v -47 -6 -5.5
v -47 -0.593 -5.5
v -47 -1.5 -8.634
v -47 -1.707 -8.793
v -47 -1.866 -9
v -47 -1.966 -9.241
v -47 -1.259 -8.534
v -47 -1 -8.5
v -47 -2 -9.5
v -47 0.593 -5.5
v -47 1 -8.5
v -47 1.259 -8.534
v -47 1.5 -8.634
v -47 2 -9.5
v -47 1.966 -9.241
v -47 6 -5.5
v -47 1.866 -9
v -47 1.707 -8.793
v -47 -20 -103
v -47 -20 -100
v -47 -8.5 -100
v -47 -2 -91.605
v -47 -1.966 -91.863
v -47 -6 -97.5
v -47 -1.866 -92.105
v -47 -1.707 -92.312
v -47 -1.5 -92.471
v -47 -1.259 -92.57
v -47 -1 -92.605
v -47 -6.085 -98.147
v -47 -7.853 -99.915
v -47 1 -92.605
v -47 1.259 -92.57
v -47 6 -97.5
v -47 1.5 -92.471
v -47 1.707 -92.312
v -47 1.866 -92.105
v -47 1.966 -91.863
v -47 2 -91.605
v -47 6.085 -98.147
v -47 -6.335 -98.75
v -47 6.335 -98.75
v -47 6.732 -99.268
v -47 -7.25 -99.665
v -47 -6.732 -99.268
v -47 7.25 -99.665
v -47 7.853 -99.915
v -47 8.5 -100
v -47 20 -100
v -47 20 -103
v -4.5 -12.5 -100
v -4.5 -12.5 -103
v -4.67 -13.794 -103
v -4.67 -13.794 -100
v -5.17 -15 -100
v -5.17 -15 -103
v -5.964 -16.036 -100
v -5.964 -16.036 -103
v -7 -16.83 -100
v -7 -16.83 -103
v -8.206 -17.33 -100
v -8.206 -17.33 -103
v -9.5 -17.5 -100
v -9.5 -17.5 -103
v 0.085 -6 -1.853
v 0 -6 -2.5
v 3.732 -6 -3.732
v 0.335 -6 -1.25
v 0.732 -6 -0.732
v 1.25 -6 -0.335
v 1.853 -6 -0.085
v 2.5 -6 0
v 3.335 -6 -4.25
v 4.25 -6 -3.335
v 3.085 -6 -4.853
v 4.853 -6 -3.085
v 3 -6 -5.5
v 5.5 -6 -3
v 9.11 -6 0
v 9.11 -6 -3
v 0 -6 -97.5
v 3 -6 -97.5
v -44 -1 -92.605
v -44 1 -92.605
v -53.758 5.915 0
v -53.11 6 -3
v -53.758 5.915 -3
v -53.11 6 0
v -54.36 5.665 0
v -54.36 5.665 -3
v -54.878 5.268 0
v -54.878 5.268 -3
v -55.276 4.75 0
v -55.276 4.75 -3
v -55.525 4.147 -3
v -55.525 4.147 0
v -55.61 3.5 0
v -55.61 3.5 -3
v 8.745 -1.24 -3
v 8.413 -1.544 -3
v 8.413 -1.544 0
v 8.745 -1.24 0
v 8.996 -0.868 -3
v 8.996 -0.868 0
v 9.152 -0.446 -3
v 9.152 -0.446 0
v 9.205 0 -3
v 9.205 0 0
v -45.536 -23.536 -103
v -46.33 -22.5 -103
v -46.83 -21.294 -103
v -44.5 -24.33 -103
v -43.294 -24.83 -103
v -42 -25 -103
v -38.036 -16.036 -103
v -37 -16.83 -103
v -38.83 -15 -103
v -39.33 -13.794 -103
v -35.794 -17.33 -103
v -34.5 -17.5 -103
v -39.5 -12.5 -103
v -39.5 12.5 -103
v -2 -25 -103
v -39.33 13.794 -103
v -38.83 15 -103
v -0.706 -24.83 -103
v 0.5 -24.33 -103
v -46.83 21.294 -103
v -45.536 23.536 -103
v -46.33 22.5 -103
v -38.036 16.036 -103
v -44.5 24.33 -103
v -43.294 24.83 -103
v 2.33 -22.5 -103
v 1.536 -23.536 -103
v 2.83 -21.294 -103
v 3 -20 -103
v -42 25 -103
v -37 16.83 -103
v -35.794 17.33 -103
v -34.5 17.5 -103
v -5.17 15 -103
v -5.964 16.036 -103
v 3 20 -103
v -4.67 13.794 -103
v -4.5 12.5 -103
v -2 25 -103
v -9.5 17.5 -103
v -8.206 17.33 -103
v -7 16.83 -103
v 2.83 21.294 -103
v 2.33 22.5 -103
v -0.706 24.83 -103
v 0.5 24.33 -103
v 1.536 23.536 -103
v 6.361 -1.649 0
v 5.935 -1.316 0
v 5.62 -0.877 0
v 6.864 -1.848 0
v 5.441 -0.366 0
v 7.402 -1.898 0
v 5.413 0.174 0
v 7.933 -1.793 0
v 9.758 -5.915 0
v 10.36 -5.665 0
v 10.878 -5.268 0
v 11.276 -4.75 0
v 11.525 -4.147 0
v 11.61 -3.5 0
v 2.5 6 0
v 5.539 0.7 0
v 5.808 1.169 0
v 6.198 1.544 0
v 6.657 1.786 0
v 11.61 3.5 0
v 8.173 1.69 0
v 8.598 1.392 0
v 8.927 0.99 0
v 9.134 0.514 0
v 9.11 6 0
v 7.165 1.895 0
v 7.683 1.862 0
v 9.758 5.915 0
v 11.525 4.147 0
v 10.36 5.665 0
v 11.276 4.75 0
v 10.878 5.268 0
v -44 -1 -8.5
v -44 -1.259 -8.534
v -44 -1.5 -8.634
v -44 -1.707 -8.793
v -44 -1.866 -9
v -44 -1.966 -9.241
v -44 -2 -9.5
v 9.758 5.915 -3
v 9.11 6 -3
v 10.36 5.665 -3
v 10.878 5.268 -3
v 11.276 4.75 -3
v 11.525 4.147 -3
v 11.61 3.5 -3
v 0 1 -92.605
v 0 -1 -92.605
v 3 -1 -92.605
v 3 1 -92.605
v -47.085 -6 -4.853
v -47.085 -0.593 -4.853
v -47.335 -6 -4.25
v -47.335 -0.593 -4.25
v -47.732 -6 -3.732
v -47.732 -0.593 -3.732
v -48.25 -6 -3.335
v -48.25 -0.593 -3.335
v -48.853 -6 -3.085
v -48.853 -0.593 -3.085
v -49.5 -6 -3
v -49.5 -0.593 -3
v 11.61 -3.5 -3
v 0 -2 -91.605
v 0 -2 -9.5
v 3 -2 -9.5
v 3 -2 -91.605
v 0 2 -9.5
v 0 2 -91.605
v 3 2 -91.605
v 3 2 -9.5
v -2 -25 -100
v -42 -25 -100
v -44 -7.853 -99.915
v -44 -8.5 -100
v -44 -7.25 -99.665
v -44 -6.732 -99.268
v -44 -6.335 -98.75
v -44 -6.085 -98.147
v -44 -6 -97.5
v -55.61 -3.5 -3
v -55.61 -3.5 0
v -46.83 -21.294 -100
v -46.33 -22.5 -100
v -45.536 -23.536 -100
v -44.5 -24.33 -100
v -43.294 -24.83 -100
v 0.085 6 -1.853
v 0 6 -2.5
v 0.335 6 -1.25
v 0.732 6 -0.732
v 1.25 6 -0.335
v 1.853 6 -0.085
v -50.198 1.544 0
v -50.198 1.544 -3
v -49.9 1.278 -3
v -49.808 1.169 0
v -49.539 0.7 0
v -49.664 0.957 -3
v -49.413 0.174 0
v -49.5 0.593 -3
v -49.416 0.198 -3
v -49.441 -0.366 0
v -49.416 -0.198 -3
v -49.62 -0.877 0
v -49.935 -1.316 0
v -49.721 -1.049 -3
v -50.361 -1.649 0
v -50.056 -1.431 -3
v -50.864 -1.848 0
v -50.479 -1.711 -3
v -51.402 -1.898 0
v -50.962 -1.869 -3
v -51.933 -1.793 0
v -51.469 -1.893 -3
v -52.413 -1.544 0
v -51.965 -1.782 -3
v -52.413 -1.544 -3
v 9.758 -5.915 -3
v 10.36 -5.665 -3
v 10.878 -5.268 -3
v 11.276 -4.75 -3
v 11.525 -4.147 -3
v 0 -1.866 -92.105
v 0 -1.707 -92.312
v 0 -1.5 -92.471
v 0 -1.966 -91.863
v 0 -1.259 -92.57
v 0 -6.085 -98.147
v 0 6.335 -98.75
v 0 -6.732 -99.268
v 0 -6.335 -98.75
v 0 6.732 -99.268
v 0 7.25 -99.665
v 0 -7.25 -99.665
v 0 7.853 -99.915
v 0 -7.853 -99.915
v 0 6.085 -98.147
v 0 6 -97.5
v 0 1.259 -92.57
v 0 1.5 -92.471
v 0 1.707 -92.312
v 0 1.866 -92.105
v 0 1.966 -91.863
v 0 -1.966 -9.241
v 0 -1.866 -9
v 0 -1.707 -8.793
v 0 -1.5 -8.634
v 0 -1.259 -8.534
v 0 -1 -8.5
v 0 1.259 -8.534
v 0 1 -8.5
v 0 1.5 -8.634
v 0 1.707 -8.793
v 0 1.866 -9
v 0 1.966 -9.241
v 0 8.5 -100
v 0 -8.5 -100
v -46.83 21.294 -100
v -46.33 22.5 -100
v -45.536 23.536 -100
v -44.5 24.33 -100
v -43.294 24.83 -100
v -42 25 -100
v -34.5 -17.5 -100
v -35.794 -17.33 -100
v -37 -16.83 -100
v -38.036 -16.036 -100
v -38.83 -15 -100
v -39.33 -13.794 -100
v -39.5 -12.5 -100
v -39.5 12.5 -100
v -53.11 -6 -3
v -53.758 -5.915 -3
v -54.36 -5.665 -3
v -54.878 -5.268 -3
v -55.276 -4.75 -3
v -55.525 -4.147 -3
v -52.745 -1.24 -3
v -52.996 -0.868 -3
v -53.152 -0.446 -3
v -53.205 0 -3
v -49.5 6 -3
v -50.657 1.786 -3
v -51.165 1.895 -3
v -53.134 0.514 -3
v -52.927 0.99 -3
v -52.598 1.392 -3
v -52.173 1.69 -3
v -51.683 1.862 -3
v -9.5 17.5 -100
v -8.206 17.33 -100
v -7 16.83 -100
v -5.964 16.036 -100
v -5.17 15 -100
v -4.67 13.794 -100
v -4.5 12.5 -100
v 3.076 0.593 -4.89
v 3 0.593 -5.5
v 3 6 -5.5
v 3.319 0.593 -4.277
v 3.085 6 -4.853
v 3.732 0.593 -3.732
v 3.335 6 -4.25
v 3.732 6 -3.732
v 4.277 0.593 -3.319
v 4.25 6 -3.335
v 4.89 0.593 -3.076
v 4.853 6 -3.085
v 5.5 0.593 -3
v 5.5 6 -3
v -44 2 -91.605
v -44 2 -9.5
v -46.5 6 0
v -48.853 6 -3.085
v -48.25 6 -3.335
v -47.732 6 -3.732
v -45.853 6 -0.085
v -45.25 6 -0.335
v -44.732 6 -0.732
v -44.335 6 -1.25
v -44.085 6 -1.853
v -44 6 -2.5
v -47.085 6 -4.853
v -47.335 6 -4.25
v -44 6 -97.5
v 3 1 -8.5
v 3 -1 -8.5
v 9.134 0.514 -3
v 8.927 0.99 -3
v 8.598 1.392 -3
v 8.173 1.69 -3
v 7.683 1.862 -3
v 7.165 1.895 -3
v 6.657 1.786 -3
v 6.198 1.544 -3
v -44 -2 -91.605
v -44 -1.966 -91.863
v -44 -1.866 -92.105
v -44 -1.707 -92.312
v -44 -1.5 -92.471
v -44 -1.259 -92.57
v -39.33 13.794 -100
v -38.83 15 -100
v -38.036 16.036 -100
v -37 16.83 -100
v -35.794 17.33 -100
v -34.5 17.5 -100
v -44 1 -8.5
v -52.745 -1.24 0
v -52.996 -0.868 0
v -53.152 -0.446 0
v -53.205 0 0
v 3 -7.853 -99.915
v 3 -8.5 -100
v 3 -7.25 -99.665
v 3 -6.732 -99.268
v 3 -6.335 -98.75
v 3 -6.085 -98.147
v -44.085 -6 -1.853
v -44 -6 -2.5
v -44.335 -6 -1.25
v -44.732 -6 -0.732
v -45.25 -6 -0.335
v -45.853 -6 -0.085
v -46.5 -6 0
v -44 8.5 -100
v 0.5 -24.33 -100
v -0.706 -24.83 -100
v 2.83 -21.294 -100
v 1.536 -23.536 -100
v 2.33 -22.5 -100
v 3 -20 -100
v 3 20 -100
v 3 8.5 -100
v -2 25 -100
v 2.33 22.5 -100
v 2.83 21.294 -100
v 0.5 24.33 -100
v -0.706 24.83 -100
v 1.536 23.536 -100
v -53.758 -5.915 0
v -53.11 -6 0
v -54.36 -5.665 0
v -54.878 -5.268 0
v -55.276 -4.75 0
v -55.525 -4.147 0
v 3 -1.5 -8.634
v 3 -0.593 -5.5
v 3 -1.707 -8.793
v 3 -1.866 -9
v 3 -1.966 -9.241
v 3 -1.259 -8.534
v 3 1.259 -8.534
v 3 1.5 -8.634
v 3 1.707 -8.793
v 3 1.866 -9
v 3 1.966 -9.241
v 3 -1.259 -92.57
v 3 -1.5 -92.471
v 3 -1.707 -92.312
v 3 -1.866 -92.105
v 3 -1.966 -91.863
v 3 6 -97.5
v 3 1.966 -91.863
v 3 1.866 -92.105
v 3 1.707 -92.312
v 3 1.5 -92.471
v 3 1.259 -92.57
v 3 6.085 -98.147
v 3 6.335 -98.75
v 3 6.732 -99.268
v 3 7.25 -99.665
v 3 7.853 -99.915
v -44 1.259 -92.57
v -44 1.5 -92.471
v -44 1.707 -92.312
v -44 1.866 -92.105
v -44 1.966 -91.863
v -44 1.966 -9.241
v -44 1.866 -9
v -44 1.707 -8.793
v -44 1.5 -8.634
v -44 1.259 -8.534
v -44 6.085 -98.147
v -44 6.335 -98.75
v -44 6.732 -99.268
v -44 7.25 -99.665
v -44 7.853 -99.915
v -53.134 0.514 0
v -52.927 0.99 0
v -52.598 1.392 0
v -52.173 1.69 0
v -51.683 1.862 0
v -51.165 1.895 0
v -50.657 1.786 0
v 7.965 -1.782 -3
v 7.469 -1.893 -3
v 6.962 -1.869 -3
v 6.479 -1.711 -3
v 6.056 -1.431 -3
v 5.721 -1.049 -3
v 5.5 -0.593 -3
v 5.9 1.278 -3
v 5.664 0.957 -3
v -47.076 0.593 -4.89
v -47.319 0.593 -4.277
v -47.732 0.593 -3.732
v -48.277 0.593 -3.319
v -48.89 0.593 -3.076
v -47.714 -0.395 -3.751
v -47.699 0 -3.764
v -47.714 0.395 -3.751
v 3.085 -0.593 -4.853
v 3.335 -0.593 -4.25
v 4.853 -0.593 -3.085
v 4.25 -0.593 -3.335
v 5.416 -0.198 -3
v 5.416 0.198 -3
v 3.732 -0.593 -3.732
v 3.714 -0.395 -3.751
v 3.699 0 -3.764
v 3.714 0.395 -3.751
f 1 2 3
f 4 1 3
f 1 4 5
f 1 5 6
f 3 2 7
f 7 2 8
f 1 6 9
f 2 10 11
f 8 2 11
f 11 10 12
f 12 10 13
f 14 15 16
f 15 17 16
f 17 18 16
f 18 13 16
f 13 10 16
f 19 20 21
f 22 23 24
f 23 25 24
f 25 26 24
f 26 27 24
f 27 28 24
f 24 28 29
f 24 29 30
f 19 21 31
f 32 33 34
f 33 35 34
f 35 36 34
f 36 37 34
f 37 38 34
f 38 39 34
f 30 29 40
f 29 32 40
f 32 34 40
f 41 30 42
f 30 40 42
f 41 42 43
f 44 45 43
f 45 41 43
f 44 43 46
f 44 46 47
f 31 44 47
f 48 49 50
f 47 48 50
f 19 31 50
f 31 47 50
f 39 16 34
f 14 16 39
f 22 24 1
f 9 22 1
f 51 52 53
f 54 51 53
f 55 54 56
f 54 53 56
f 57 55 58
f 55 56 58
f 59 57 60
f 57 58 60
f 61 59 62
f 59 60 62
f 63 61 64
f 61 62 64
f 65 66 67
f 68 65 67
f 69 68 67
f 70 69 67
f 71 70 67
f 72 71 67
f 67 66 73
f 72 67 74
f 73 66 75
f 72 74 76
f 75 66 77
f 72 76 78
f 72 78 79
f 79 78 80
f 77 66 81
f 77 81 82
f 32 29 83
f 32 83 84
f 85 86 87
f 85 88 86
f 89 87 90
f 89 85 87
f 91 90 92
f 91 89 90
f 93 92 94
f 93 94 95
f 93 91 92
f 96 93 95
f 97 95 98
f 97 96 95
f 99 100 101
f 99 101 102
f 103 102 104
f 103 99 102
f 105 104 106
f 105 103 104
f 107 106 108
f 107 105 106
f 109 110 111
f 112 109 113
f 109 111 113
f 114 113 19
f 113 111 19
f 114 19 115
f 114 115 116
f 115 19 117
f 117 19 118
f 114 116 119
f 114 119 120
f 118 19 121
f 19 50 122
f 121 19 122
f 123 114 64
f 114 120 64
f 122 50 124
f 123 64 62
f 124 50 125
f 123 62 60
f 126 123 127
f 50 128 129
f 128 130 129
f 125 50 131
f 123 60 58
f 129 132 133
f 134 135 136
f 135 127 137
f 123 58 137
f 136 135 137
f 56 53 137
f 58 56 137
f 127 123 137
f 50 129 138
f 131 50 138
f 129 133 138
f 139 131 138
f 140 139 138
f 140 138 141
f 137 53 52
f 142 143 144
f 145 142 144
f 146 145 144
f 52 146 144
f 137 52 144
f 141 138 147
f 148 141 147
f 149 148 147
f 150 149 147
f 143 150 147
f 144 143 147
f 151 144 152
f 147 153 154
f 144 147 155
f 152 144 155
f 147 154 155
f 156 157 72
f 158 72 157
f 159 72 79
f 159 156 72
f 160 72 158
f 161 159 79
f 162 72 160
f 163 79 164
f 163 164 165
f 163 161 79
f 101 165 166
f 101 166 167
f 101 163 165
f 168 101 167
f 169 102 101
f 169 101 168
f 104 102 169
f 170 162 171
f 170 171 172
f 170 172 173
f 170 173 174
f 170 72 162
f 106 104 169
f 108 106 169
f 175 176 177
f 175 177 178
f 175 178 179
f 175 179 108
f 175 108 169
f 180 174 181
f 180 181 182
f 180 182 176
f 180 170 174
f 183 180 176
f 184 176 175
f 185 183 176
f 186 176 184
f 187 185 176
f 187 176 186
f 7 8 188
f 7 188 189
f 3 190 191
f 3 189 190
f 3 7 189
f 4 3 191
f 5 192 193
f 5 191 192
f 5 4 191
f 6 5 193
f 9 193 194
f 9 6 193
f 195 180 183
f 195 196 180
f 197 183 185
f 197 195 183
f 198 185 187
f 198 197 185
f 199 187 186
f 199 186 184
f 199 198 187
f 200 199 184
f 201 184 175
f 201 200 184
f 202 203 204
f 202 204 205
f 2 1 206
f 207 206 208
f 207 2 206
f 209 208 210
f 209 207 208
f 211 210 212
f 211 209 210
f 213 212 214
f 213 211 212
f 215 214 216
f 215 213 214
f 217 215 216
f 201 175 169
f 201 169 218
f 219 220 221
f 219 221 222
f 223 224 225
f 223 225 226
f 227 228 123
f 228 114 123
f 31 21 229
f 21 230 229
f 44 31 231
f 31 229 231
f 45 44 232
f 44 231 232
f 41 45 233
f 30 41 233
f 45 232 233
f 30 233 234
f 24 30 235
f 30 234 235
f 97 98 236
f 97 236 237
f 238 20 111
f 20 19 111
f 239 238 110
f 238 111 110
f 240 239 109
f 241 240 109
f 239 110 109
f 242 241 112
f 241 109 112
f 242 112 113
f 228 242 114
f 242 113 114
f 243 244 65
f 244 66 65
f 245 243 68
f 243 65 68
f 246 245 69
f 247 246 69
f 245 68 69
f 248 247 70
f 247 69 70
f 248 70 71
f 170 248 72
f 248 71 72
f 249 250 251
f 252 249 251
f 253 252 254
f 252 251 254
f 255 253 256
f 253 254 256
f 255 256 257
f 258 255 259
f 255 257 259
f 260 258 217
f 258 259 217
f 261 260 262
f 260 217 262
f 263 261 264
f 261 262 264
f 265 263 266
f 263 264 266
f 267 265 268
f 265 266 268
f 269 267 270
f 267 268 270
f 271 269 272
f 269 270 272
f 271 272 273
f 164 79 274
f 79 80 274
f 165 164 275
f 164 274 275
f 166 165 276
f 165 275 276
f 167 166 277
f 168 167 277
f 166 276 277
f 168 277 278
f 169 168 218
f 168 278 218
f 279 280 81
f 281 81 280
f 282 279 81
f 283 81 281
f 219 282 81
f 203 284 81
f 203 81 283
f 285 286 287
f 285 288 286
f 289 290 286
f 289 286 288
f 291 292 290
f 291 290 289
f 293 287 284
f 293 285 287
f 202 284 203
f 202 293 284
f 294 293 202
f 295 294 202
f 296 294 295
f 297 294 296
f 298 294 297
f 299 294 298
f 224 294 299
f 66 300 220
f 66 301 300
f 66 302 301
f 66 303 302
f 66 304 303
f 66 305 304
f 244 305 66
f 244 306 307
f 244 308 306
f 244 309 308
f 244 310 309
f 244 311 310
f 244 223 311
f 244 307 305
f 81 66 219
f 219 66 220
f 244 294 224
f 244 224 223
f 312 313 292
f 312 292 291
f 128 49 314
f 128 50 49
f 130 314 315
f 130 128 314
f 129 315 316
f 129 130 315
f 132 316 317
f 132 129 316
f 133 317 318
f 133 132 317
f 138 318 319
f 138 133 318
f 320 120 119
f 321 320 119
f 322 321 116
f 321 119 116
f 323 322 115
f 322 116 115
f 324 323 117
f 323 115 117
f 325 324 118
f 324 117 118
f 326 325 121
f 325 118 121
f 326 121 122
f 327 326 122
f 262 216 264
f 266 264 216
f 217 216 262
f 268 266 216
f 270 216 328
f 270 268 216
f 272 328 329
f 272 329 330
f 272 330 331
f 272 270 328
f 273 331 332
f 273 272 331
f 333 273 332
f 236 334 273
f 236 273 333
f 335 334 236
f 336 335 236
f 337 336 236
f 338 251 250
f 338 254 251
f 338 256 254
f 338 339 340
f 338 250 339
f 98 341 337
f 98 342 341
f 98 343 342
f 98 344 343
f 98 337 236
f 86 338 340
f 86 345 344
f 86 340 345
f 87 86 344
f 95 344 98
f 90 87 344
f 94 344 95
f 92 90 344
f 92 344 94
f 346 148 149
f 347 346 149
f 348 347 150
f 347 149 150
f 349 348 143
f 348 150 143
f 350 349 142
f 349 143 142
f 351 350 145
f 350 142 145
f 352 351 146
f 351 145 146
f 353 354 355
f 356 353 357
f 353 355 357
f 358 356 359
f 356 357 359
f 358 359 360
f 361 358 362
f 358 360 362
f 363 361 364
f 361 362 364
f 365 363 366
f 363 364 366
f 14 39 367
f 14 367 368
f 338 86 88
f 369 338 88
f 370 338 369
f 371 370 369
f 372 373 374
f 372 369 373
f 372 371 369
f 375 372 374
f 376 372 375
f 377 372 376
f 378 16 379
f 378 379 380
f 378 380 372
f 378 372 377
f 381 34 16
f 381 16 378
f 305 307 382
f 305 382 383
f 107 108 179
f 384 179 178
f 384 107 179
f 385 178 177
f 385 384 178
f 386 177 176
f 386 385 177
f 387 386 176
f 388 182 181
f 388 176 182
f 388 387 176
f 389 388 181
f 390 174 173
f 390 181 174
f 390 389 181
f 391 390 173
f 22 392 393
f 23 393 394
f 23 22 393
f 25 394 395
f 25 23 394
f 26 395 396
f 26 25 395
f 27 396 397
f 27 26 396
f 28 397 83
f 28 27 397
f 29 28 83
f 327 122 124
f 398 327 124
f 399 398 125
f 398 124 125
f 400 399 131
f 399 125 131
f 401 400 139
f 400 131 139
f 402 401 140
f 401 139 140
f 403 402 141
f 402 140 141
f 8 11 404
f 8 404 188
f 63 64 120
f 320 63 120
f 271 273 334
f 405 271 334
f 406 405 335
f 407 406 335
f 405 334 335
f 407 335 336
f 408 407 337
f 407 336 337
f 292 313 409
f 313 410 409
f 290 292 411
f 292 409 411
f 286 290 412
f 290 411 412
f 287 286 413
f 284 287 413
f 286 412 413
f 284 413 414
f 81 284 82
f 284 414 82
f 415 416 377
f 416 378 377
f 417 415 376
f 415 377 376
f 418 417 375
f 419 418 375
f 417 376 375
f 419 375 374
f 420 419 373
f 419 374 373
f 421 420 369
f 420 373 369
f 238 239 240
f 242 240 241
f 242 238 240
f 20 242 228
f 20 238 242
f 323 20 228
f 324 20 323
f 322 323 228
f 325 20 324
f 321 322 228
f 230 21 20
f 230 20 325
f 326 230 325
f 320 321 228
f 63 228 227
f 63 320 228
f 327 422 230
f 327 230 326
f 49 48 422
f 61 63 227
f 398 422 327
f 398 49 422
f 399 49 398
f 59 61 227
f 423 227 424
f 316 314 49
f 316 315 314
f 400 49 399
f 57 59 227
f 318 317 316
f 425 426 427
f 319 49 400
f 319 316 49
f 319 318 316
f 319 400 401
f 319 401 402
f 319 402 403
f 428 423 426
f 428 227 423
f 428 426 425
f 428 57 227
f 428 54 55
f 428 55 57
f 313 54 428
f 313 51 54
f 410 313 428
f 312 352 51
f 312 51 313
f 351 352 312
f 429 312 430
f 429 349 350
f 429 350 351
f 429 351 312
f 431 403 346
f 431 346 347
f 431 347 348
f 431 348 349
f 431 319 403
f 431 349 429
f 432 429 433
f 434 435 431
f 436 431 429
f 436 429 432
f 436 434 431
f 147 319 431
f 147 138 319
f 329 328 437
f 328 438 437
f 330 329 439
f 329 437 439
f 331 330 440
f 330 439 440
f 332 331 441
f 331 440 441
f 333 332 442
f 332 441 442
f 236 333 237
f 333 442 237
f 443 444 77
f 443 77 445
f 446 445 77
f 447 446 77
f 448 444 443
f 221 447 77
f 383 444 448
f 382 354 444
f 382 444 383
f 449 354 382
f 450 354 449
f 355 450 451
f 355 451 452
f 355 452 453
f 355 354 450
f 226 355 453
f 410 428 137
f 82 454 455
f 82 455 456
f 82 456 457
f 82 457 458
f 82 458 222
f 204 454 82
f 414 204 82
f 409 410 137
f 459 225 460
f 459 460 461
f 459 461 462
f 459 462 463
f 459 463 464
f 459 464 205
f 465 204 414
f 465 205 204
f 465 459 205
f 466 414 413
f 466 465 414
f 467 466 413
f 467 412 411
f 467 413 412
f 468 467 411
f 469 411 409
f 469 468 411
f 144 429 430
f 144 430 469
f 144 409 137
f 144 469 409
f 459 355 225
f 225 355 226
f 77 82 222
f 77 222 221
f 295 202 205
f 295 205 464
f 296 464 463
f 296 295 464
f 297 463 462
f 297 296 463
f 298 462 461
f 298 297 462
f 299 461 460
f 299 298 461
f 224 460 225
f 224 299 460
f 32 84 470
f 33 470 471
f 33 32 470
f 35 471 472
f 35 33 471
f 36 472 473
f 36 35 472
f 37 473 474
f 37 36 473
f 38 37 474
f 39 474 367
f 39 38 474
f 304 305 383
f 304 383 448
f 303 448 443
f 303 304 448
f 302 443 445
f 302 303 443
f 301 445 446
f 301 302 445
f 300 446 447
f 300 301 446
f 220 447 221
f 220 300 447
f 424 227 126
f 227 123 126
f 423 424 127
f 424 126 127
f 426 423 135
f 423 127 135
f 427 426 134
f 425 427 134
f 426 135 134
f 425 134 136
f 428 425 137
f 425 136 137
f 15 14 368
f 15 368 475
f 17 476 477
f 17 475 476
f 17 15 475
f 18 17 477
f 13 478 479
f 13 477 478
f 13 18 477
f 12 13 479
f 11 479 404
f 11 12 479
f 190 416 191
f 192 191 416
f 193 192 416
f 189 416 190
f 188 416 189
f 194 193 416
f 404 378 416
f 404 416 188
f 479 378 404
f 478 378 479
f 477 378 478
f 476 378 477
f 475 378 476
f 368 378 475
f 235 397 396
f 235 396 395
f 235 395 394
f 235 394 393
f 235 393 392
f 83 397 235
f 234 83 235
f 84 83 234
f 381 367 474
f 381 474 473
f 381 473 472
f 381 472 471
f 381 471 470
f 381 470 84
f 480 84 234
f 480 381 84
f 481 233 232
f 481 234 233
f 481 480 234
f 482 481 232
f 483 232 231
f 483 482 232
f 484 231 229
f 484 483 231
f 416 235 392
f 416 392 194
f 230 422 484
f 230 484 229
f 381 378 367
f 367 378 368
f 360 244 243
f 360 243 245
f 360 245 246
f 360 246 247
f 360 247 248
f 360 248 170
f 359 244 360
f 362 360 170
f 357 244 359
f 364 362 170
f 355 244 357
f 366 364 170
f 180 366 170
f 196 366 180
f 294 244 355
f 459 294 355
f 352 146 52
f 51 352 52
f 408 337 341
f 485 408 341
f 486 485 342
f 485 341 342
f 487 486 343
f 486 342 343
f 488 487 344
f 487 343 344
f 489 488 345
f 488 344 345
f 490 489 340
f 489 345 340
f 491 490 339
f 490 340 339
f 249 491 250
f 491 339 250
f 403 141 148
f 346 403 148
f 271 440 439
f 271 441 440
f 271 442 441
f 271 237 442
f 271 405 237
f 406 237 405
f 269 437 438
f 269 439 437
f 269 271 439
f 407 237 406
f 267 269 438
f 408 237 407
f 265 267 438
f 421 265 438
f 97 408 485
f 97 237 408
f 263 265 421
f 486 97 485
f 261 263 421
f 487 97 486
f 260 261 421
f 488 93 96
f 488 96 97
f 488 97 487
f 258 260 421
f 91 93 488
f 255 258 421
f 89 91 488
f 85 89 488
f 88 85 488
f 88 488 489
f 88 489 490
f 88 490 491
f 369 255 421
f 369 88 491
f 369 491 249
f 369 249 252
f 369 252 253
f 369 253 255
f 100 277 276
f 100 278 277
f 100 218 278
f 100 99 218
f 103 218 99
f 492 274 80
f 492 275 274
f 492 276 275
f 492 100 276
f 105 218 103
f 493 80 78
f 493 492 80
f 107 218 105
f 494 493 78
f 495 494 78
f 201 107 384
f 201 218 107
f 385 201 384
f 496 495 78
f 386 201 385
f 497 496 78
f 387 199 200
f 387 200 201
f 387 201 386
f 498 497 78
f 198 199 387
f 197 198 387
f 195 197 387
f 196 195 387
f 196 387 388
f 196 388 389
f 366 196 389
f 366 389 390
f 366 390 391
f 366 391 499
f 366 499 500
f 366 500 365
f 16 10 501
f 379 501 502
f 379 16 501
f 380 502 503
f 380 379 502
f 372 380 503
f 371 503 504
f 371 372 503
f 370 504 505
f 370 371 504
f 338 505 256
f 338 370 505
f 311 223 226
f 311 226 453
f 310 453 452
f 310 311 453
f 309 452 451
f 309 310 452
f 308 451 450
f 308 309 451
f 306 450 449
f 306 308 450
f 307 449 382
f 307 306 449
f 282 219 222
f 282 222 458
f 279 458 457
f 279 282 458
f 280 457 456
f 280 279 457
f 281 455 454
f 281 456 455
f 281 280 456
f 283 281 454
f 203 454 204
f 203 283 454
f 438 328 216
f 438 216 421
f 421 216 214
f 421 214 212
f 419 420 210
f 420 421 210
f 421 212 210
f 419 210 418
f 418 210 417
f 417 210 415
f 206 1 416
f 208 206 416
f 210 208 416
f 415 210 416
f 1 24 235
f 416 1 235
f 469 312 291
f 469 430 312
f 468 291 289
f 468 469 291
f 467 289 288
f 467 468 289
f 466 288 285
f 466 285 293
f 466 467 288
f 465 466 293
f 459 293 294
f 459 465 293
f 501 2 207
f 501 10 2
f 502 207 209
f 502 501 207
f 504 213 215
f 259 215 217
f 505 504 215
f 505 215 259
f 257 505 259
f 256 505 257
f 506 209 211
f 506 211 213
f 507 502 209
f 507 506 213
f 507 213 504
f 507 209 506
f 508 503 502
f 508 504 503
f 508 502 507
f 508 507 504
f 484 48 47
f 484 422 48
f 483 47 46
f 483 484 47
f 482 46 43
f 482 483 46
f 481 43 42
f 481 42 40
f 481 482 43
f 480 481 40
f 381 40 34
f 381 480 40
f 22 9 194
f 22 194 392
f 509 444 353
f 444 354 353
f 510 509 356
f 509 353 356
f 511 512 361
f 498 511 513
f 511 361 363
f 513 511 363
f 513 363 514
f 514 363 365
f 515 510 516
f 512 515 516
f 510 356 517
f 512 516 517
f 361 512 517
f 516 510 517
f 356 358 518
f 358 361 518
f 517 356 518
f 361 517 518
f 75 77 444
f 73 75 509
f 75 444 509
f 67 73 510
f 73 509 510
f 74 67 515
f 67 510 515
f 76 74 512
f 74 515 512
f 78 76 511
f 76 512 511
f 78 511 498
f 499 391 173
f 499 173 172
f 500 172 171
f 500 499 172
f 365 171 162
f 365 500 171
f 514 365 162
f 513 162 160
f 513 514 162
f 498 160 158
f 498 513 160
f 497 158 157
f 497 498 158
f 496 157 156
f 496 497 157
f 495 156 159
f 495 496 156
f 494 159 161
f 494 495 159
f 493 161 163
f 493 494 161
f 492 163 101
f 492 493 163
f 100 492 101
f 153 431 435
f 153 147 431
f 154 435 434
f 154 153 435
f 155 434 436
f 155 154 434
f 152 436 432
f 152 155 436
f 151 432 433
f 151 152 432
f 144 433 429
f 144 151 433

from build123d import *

# Parameters (mm, degrees)
BOSS_EXTRUDE1_DEPTH = 6
SKETCH2_W           = 50
SKETCH2_H           = 3
BOSS_EXTRUDE2_DEPTH = 25
CUT_EXTRUDE1_DEPTH  = 50
CUT_EXTRUDE2_DEPTH  = 25
FILLET1_R           = 5
FILLET2_R           = 2.5
CUT_EXTRUDE3_DEPTH  = 88


with BuildPart() as part:
    # Sketch1 → Boss-Extrude1 (new, symmetric)
    with BuildSketch(Plane(origin=(0, 0, 0), x_dir=(1, 0, 0), z_dir=(0, 1, 0))):
        Polygon((0, 0), (11.610474965, 0), (11.610474965, 3), (3, 3), (3, 100), (3, 103), (-47, 103), (-47, 100), (-47, 3), (-55.610474965, 3), (-55.610474965, 0), (-44, 0), (-44, 100), (0, 100), align=None)
    extrude(amount=BOSS_EXTRUDE1_DEPTH, both=True)

    # Sketch2 → Boss-Extrude2 (add, symmetric)
    with BuildSketch(Plane(origin=(0, 0, 0), x_dir=(1, 0, 0), z_dir=(0, 1, 0))):
        with Locations((-22, 101.5)):
            Rectangle(SKETCH2_W, SKETCH2_H)
    extrude(amount=BOSS_EXTRUDE2_DEPTH, both=True)

    # Sketch4 → Cut-Extrude1 (cut)
    with BuildSketch(Plane(origin=(0, 0, -3), x_dir=(-1, 0, 0), z_dir=(0, 0, -1))):
        with BuildLine():
            ThreePointArc((53.205237482, 0), (52.172824783, 1.690352707), (50.197561403, 1.543714256))
            Line((50.197561403, 1.543714256), (52.412913562, -1.543714256))
            ThreePointArc((52.412913562, -1.543714256), (52.99559019, -0.867587301), (53.205237482, 0))
        make_face()
        with BuildLine():
            Line((52.412913562, -1.543714256), (50.197561403, 1.543714256))
            ThreePointArc((50.197561403, 1.543714256), (49.761523227, -1.107676079), (52.412913562, -1.543714256))
        make_face()
    cut_extrude1 = extrude(amount=-CUT_EXTRUDE1_DEPTH, mode=Mode.SUBTRACT)

    # Mirror1: Cut-Extrude1 across plane
    add(cut_extrude1.mirror(Plane(origin=(-22, 0, 0), x_dir=(0, 0, 1), z_dir=(1, 0, 0))), mode=Mode.SUBTRACT)

    # Sketch6 → Cut-Extrude2 (cut, symmetric)
    with BuildSketch(Plane(origin=(0, 0, -103), x_dir=(-1, 0, 0), z_dir=(0, 0, -1))):
        with BuildLine():
            Line((9.5, -17.5), (34.5, -17.5))
            ThreePointArc((34.5, -17.5), (38.035533906, -16.035533906), (39.5, -12.5))
            Line((39.5, -12.5), (39.5, 12.5))
            ThreePointArc((39.5, 12.5), (38.035533906, 16.035533906), (34.5, 17.5))
            Line((34.5, 17.5), (9.5, 17.5))
            ThreePointArc((9.5, 17.5), (5.964466094, 16.035533906), (4.5, 12.5))
            Line((4.5, 12.5), (4.5, -12.5))
            ThreePointArc((4.5, -12.5), (5.964466094, -16.035533906), (9.5, -17.5))
        make_face()
    extrude(amount=CUT_EXTRUDE2_DEPTH, both=True, mode=Mode.SUBTRACT)

    # Fillet1
    fillet1_edges = [part.edges().sort_by_distance(p)[0] for p in [
        (3, 25, -101.5),
        (-47, -25, -101.5),
        (-47, 25, -101.5),
        (3, -25, -101.5),
    ]]
    fillet(fillet1_edges, radius=FILLET1_R)

    # Fillet2
    fillet2_edges = [part.edges().sort_by_distance(p)[0] for p in [
        (11.610474965, 6, -1.5),
        (-55.610474965, -6, -1.5),
        (11.610474965, -6, -1.5),
        (-44, 0, 0),
        (-47, 0, -3),
        (3, 0, -3),
        (0, 0, 0),
        (1.5, -6, -100),
        (-45.5, -6, -100),
        (-55.610474965, 6, -1.5),
        (-45.5, 6, -100),
        (1.5, 6, -100),
    ]]
    fillet(fillet2_edges, radius=FILLET2_R)

    # Sketch7 → Cut-Extrude3 (cut)
    with BuildSketch(Plane.ZY.offset(47)):
        with BuildLine():
            Line((-91.604504773, 2), (-9.5, 2))
            ThreePointArc((-9.5, 2), (-8.792893219, 1.707106781), (-8.5, 1))
            Line((-8.5, 1), (-8.5, -1))
            ThreePointArc((-8.5, -1), (-8.792893219, -1.707106781), (-9.5, -2))
            Line((-9.5, -2), (-91.604504773, -2))
            ThreePointArc((-91.604504773, -2), (-92.311611555, -1.707106781), (-92.604504773, -1))
            Line((-92.604504773, -1), (-92.604504773, 1))
            ThreePointArc((-92.604504773, 1), (-92.311611555, 1.707106781), (-91.604504773, 2))
        make_face()
    extrude(amount=-CUT_EXTRUDE3_DEPTH, mode=Mode.SUBTRACT)


solid = part.part
